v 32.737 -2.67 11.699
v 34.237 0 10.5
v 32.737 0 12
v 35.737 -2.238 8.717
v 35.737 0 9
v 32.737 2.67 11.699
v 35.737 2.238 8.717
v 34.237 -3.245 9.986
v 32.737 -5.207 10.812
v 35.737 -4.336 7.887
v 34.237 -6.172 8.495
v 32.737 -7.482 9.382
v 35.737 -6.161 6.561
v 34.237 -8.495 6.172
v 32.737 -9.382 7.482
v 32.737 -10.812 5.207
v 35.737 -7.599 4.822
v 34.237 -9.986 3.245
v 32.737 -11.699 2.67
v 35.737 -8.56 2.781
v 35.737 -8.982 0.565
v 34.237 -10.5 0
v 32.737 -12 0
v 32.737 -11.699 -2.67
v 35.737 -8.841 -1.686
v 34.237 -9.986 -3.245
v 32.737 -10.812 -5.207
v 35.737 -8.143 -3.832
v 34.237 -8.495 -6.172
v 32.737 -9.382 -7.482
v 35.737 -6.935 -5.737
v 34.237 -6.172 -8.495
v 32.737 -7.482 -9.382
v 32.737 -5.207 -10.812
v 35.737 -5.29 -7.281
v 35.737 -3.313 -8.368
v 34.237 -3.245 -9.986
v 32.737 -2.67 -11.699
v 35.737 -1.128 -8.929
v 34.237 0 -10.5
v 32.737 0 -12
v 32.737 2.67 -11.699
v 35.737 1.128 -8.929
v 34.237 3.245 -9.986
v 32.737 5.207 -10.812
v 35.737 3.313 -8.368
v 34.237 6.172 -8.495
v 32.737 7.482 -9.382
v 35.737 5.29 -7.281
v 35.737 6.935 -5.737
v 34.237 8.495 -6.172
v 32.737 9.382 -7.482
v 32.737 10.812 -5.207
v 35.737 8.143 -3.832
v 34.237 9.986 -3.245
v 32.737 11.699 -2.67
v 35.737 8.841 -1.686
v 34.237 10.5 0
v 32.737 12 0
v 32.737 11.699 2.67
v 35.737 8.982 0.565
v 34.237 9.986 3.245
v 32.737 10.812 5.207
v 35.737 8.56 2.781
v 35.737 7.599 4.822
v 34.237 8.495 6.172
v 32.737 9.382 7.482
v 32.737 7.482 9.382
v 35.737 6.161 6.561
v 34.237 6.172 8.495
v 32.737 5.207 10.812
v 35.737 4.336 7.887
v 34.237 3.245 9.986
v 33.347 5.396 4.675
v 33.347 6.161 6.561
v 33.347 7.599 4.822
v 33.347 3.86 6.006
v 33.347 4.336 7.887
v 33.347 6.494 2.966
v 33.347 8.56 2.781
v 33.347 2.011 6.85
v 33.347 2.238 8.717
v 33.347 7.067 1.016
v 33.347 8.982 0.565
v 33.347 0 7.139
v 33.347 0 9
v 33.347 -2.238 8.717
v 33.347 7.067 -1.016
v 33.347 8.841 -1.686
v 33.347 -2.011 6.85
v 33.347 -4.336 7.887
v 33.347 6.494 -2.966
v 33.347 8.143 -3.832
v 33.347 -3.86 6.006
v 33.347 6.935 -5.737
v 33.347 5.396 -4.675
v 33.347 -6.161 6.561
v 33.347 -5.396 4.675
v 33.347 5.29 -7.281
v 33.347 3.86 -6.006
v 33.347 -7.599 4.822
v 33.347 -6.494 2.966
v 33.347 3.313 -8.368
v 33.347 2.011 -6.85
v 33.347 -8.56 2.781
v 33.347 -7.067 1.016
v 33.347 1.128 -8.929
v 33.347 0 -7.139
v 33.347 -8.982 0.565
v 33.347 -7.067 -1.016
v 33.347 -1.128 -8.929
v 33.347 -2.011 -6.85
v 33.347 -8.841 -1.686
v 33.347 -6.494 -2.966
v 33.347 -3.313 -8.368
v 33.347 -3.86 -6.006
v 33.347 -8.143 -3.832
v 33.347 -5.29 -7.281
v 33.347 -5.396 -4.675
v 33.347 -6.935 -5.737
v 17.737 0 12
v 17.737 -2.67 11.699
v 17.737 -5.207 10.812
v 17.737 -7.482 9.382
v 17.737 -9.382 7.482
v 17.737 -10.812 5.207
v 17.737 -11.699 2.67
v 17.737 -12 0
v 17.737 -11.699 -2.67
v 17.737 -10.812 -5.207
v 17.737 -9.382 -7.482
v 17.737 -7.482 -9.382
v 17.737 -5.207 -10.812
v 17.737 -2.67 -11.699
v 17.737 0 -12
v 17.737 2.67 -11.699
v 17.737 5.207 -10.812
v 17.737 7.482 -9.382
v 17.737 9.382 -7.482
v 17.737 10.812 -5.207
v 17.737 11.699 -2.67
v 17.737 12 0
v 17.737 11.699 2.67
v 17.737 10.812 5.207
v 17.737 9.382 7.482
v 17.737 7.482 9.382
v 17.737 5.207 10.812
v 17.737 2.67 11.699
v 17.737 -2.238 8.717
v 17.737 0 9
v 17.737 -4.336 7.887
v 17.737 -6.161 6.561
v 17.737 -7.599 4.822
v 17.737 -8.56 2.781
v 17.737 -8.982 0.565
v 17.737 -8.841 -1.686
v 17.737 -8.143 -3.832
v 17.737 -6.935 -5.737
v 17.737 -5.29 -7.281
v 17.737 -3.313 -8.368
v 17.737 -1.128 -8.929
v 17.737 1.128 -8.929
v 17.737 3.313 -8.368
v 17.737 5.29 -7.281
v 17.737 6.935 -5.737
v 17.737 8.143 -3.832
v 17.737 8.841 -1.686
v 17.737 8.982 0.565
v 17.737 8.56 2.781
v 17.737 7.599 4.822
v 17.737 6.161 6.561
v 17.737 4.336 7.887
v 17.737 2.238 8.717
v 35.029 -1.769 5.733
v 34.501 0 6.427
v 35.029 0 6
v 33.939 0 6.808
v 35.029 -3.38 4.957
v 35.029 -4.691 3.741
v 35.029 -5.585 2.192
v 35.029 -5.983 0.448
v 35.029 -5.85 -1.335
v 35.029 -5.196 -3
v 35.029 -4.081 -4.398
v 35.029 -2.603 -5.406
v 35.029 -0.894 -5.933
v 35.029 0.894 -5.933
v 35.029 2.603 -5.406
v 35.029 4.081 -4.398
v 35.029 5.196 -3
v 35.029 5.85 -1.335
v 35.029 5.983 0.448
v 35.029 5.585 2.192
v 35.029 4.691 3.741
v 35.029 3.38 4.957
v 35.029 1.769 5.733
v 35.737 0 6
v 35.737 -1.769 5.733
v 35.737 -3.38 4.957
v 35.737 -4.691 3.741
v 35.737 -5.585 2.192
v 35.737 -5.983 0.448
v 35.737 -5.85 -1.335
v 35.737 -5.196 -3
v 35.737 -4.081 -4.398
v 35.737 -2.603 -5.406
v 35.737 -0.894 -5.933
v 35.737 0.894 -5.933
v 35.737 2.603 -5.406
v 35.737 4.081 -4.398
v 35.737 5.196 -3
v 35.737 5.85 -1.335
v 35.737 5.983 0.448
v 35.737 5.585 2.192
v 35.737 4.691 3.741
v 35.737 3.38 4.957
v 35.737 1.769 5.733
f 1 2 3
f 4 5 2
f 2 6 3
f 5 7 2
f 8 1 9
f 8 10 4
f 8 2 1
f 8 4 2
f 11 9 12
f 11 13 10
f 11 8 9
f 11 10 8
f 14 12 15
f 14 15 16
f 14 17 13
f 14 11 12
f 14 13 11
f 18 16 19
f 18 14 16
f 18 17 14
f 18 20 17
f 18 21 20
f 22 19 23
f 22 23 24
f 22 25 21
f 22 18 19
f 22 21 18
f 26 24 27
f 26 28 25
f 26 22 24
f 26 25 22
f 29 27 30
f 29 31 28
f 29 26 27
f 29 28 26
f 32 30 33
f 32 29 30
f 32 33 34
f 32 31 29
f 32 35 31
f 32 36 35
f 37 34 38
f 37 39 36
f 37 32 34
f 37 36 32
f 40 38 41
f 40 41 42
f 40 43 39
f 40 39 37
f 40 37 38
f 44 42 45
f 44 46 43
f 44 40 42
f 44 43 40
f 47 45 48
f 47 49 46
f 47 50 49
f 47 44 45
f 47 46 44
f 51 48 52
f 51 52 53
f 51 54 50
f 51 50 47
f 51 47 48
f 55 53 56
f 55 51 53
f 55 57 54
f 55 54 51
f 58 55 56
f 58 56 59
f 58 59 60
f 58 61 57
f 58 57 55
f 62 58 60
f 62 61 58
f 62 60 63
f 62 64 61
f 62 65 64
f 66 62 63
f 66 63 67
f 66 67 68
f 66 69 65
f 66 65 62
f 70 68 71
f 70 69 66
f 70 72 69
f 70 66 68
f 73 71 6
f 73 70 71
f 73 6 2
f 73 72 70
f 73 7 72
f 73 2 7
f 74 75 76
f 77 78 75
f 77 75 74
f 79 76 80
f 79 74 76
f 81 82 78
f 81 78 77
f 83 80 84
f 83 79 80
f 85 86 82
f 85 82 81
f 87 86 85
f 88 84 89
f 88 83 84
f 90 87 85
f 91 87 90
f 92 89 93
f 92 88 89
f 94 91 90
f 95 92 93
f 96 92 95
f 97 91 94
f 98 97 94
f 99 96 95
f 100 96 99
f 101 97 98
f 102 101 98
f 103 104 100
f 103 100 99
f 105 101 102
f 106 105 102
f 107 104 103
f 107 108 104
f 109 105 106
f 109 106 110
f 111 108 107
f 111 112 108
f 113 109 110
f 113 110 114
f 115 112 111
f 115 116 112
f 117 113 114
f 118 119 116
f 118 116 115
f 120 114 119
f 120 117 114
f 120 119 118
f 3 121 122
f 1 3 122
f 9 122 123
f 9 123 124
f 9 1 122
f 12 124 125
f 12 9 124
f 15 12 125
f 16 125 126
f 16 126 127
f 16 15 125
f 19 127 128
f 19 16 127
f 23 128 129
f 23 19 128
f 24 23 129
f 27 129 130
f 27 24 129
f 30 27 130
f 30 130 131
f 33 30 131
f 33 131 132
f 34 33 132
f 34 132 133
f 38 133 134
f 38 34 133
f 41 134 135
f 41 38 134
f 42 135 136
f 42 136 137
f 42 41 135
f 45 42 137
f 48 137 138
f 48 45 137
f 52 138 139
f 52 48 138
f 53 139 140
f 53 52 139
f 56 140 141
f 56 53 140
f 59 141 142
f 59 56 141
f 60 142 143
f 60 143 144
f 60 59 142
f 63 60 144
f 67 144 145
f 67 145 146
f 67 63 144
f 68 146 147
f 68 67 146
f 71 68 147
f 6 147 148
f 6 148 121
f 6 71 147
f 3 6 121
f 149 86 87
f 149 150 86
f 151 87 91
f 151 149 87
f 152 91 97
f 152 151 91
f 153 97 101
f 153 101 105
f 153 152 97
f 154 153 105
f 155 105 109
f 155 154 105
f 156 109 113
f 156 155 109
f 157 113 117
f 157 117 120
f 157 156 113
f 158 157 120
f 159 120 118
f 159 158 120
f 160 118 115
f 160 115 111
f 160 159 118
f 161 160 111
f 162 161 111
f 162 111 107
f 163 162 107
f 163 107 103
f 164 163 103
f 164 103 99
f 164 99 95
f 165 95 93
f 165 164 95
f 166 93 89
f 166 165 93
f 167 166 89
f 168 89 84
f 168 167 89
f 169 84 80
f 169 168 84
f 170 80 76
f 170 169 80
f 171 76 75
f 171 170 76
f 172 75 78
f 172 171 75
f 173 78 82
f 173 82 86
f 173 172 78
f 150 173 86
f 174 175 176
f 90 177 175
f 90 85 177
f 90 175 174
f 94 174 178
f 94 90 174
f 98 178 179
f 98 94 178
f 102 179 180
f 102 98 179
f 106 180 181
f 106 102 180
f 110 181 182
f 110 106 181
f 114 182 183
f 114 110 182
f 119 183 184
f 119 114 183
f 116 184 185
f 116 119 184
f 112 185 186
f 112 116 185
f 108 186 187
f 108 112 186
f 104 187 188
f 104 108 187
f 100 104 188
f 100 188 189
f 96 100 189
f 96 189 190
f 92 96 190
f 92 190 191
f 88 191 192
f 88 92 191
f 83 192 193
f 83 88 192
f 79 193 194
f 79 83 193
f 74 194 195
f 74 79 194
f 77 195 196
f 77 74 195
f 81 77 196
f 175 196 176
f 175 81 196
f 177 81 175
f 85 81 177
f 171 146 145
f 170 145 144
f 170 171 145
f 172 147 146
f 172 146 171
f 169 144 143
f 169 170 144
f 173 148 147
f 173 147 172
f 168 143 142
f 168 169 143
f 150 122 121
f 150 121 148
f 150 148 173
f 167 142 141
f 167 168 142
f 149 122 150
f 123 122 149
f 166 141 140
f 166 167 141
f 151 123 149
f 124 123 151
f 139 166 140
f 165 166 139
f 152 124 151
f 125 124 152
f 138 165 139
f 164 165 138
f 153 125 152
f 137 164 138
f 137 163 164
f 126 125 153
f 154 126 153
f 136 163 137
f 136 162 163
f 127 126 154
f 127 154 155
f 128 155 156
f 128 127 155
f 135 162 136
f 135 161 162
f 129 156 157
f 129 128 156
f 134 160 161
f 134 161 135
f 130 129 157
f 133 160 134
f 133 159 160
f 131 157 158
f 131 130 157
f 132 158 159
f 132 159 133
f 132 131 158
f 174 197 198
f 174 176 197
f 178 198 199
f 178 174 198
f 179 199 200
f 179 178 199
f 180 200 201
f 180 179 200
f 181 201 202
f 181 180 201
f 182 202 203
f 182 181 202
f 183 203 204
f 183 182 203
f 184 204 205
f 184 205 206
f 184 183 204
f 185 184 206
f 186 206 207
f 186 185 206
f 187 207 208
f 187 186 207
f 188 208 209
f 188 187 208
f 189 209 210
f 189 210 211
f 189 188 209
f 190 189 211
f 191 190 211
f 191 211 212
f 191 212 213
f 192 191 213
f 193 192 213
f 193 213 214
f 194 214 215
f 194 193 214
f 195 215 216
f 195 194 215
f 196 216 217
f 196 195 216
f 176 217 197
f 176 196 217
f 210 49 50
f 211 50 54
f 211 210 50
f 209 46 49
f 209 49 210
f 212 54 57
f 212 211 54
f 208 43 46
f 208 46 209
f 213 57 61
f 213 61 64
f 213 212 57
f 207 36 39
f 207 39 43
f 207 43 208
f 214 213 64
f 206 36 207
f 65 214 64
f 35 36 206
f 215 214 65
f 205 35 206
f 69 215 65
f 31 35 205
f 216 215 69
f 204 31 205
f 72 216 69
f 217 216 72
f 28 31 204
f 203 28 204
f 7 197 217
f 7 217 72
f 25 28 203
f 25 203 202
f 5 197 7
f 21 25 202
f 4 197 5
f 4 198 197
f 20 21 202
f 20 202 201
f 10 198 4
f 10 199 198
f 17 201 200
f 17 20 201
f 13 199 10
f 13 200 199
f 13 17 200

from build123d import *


with BuildPart() as part:
    # 草图1 → 旋转1 (revolve)
    with BuildSketch(Plane.XY, mode=Mode.PRIVATE) as revolve_1_sk:
        with BuildLine():
            Line((32.73725094, 12), (35.73725094, 9))
            Line((35.73725094, 9), (35.73725094, 6))
            Line((35.73725094, 6), (35.028753562, 6))
            ThreePointArc((35.028753562, 6), (34.224082532, 6.623318071), (33.346779451, 7.139419019))
            Line((33.346779451, 7.139419019), (33.346779451, 9))
            Line((33.346779451, 9), (17.73725094, 9))
            Line((17.73725094, 9), (17.73725094, 12))
            Line((17.73725094, 12), (32.73725094, 12))
        make_face()
    revolve(revolve_1_sk.sketch.rotate(Axis((0, 0, 0), (1, 0, 0)), 90), axis=Axis((0, 0, 0), (1, 0, 0)))


solid = part.part
